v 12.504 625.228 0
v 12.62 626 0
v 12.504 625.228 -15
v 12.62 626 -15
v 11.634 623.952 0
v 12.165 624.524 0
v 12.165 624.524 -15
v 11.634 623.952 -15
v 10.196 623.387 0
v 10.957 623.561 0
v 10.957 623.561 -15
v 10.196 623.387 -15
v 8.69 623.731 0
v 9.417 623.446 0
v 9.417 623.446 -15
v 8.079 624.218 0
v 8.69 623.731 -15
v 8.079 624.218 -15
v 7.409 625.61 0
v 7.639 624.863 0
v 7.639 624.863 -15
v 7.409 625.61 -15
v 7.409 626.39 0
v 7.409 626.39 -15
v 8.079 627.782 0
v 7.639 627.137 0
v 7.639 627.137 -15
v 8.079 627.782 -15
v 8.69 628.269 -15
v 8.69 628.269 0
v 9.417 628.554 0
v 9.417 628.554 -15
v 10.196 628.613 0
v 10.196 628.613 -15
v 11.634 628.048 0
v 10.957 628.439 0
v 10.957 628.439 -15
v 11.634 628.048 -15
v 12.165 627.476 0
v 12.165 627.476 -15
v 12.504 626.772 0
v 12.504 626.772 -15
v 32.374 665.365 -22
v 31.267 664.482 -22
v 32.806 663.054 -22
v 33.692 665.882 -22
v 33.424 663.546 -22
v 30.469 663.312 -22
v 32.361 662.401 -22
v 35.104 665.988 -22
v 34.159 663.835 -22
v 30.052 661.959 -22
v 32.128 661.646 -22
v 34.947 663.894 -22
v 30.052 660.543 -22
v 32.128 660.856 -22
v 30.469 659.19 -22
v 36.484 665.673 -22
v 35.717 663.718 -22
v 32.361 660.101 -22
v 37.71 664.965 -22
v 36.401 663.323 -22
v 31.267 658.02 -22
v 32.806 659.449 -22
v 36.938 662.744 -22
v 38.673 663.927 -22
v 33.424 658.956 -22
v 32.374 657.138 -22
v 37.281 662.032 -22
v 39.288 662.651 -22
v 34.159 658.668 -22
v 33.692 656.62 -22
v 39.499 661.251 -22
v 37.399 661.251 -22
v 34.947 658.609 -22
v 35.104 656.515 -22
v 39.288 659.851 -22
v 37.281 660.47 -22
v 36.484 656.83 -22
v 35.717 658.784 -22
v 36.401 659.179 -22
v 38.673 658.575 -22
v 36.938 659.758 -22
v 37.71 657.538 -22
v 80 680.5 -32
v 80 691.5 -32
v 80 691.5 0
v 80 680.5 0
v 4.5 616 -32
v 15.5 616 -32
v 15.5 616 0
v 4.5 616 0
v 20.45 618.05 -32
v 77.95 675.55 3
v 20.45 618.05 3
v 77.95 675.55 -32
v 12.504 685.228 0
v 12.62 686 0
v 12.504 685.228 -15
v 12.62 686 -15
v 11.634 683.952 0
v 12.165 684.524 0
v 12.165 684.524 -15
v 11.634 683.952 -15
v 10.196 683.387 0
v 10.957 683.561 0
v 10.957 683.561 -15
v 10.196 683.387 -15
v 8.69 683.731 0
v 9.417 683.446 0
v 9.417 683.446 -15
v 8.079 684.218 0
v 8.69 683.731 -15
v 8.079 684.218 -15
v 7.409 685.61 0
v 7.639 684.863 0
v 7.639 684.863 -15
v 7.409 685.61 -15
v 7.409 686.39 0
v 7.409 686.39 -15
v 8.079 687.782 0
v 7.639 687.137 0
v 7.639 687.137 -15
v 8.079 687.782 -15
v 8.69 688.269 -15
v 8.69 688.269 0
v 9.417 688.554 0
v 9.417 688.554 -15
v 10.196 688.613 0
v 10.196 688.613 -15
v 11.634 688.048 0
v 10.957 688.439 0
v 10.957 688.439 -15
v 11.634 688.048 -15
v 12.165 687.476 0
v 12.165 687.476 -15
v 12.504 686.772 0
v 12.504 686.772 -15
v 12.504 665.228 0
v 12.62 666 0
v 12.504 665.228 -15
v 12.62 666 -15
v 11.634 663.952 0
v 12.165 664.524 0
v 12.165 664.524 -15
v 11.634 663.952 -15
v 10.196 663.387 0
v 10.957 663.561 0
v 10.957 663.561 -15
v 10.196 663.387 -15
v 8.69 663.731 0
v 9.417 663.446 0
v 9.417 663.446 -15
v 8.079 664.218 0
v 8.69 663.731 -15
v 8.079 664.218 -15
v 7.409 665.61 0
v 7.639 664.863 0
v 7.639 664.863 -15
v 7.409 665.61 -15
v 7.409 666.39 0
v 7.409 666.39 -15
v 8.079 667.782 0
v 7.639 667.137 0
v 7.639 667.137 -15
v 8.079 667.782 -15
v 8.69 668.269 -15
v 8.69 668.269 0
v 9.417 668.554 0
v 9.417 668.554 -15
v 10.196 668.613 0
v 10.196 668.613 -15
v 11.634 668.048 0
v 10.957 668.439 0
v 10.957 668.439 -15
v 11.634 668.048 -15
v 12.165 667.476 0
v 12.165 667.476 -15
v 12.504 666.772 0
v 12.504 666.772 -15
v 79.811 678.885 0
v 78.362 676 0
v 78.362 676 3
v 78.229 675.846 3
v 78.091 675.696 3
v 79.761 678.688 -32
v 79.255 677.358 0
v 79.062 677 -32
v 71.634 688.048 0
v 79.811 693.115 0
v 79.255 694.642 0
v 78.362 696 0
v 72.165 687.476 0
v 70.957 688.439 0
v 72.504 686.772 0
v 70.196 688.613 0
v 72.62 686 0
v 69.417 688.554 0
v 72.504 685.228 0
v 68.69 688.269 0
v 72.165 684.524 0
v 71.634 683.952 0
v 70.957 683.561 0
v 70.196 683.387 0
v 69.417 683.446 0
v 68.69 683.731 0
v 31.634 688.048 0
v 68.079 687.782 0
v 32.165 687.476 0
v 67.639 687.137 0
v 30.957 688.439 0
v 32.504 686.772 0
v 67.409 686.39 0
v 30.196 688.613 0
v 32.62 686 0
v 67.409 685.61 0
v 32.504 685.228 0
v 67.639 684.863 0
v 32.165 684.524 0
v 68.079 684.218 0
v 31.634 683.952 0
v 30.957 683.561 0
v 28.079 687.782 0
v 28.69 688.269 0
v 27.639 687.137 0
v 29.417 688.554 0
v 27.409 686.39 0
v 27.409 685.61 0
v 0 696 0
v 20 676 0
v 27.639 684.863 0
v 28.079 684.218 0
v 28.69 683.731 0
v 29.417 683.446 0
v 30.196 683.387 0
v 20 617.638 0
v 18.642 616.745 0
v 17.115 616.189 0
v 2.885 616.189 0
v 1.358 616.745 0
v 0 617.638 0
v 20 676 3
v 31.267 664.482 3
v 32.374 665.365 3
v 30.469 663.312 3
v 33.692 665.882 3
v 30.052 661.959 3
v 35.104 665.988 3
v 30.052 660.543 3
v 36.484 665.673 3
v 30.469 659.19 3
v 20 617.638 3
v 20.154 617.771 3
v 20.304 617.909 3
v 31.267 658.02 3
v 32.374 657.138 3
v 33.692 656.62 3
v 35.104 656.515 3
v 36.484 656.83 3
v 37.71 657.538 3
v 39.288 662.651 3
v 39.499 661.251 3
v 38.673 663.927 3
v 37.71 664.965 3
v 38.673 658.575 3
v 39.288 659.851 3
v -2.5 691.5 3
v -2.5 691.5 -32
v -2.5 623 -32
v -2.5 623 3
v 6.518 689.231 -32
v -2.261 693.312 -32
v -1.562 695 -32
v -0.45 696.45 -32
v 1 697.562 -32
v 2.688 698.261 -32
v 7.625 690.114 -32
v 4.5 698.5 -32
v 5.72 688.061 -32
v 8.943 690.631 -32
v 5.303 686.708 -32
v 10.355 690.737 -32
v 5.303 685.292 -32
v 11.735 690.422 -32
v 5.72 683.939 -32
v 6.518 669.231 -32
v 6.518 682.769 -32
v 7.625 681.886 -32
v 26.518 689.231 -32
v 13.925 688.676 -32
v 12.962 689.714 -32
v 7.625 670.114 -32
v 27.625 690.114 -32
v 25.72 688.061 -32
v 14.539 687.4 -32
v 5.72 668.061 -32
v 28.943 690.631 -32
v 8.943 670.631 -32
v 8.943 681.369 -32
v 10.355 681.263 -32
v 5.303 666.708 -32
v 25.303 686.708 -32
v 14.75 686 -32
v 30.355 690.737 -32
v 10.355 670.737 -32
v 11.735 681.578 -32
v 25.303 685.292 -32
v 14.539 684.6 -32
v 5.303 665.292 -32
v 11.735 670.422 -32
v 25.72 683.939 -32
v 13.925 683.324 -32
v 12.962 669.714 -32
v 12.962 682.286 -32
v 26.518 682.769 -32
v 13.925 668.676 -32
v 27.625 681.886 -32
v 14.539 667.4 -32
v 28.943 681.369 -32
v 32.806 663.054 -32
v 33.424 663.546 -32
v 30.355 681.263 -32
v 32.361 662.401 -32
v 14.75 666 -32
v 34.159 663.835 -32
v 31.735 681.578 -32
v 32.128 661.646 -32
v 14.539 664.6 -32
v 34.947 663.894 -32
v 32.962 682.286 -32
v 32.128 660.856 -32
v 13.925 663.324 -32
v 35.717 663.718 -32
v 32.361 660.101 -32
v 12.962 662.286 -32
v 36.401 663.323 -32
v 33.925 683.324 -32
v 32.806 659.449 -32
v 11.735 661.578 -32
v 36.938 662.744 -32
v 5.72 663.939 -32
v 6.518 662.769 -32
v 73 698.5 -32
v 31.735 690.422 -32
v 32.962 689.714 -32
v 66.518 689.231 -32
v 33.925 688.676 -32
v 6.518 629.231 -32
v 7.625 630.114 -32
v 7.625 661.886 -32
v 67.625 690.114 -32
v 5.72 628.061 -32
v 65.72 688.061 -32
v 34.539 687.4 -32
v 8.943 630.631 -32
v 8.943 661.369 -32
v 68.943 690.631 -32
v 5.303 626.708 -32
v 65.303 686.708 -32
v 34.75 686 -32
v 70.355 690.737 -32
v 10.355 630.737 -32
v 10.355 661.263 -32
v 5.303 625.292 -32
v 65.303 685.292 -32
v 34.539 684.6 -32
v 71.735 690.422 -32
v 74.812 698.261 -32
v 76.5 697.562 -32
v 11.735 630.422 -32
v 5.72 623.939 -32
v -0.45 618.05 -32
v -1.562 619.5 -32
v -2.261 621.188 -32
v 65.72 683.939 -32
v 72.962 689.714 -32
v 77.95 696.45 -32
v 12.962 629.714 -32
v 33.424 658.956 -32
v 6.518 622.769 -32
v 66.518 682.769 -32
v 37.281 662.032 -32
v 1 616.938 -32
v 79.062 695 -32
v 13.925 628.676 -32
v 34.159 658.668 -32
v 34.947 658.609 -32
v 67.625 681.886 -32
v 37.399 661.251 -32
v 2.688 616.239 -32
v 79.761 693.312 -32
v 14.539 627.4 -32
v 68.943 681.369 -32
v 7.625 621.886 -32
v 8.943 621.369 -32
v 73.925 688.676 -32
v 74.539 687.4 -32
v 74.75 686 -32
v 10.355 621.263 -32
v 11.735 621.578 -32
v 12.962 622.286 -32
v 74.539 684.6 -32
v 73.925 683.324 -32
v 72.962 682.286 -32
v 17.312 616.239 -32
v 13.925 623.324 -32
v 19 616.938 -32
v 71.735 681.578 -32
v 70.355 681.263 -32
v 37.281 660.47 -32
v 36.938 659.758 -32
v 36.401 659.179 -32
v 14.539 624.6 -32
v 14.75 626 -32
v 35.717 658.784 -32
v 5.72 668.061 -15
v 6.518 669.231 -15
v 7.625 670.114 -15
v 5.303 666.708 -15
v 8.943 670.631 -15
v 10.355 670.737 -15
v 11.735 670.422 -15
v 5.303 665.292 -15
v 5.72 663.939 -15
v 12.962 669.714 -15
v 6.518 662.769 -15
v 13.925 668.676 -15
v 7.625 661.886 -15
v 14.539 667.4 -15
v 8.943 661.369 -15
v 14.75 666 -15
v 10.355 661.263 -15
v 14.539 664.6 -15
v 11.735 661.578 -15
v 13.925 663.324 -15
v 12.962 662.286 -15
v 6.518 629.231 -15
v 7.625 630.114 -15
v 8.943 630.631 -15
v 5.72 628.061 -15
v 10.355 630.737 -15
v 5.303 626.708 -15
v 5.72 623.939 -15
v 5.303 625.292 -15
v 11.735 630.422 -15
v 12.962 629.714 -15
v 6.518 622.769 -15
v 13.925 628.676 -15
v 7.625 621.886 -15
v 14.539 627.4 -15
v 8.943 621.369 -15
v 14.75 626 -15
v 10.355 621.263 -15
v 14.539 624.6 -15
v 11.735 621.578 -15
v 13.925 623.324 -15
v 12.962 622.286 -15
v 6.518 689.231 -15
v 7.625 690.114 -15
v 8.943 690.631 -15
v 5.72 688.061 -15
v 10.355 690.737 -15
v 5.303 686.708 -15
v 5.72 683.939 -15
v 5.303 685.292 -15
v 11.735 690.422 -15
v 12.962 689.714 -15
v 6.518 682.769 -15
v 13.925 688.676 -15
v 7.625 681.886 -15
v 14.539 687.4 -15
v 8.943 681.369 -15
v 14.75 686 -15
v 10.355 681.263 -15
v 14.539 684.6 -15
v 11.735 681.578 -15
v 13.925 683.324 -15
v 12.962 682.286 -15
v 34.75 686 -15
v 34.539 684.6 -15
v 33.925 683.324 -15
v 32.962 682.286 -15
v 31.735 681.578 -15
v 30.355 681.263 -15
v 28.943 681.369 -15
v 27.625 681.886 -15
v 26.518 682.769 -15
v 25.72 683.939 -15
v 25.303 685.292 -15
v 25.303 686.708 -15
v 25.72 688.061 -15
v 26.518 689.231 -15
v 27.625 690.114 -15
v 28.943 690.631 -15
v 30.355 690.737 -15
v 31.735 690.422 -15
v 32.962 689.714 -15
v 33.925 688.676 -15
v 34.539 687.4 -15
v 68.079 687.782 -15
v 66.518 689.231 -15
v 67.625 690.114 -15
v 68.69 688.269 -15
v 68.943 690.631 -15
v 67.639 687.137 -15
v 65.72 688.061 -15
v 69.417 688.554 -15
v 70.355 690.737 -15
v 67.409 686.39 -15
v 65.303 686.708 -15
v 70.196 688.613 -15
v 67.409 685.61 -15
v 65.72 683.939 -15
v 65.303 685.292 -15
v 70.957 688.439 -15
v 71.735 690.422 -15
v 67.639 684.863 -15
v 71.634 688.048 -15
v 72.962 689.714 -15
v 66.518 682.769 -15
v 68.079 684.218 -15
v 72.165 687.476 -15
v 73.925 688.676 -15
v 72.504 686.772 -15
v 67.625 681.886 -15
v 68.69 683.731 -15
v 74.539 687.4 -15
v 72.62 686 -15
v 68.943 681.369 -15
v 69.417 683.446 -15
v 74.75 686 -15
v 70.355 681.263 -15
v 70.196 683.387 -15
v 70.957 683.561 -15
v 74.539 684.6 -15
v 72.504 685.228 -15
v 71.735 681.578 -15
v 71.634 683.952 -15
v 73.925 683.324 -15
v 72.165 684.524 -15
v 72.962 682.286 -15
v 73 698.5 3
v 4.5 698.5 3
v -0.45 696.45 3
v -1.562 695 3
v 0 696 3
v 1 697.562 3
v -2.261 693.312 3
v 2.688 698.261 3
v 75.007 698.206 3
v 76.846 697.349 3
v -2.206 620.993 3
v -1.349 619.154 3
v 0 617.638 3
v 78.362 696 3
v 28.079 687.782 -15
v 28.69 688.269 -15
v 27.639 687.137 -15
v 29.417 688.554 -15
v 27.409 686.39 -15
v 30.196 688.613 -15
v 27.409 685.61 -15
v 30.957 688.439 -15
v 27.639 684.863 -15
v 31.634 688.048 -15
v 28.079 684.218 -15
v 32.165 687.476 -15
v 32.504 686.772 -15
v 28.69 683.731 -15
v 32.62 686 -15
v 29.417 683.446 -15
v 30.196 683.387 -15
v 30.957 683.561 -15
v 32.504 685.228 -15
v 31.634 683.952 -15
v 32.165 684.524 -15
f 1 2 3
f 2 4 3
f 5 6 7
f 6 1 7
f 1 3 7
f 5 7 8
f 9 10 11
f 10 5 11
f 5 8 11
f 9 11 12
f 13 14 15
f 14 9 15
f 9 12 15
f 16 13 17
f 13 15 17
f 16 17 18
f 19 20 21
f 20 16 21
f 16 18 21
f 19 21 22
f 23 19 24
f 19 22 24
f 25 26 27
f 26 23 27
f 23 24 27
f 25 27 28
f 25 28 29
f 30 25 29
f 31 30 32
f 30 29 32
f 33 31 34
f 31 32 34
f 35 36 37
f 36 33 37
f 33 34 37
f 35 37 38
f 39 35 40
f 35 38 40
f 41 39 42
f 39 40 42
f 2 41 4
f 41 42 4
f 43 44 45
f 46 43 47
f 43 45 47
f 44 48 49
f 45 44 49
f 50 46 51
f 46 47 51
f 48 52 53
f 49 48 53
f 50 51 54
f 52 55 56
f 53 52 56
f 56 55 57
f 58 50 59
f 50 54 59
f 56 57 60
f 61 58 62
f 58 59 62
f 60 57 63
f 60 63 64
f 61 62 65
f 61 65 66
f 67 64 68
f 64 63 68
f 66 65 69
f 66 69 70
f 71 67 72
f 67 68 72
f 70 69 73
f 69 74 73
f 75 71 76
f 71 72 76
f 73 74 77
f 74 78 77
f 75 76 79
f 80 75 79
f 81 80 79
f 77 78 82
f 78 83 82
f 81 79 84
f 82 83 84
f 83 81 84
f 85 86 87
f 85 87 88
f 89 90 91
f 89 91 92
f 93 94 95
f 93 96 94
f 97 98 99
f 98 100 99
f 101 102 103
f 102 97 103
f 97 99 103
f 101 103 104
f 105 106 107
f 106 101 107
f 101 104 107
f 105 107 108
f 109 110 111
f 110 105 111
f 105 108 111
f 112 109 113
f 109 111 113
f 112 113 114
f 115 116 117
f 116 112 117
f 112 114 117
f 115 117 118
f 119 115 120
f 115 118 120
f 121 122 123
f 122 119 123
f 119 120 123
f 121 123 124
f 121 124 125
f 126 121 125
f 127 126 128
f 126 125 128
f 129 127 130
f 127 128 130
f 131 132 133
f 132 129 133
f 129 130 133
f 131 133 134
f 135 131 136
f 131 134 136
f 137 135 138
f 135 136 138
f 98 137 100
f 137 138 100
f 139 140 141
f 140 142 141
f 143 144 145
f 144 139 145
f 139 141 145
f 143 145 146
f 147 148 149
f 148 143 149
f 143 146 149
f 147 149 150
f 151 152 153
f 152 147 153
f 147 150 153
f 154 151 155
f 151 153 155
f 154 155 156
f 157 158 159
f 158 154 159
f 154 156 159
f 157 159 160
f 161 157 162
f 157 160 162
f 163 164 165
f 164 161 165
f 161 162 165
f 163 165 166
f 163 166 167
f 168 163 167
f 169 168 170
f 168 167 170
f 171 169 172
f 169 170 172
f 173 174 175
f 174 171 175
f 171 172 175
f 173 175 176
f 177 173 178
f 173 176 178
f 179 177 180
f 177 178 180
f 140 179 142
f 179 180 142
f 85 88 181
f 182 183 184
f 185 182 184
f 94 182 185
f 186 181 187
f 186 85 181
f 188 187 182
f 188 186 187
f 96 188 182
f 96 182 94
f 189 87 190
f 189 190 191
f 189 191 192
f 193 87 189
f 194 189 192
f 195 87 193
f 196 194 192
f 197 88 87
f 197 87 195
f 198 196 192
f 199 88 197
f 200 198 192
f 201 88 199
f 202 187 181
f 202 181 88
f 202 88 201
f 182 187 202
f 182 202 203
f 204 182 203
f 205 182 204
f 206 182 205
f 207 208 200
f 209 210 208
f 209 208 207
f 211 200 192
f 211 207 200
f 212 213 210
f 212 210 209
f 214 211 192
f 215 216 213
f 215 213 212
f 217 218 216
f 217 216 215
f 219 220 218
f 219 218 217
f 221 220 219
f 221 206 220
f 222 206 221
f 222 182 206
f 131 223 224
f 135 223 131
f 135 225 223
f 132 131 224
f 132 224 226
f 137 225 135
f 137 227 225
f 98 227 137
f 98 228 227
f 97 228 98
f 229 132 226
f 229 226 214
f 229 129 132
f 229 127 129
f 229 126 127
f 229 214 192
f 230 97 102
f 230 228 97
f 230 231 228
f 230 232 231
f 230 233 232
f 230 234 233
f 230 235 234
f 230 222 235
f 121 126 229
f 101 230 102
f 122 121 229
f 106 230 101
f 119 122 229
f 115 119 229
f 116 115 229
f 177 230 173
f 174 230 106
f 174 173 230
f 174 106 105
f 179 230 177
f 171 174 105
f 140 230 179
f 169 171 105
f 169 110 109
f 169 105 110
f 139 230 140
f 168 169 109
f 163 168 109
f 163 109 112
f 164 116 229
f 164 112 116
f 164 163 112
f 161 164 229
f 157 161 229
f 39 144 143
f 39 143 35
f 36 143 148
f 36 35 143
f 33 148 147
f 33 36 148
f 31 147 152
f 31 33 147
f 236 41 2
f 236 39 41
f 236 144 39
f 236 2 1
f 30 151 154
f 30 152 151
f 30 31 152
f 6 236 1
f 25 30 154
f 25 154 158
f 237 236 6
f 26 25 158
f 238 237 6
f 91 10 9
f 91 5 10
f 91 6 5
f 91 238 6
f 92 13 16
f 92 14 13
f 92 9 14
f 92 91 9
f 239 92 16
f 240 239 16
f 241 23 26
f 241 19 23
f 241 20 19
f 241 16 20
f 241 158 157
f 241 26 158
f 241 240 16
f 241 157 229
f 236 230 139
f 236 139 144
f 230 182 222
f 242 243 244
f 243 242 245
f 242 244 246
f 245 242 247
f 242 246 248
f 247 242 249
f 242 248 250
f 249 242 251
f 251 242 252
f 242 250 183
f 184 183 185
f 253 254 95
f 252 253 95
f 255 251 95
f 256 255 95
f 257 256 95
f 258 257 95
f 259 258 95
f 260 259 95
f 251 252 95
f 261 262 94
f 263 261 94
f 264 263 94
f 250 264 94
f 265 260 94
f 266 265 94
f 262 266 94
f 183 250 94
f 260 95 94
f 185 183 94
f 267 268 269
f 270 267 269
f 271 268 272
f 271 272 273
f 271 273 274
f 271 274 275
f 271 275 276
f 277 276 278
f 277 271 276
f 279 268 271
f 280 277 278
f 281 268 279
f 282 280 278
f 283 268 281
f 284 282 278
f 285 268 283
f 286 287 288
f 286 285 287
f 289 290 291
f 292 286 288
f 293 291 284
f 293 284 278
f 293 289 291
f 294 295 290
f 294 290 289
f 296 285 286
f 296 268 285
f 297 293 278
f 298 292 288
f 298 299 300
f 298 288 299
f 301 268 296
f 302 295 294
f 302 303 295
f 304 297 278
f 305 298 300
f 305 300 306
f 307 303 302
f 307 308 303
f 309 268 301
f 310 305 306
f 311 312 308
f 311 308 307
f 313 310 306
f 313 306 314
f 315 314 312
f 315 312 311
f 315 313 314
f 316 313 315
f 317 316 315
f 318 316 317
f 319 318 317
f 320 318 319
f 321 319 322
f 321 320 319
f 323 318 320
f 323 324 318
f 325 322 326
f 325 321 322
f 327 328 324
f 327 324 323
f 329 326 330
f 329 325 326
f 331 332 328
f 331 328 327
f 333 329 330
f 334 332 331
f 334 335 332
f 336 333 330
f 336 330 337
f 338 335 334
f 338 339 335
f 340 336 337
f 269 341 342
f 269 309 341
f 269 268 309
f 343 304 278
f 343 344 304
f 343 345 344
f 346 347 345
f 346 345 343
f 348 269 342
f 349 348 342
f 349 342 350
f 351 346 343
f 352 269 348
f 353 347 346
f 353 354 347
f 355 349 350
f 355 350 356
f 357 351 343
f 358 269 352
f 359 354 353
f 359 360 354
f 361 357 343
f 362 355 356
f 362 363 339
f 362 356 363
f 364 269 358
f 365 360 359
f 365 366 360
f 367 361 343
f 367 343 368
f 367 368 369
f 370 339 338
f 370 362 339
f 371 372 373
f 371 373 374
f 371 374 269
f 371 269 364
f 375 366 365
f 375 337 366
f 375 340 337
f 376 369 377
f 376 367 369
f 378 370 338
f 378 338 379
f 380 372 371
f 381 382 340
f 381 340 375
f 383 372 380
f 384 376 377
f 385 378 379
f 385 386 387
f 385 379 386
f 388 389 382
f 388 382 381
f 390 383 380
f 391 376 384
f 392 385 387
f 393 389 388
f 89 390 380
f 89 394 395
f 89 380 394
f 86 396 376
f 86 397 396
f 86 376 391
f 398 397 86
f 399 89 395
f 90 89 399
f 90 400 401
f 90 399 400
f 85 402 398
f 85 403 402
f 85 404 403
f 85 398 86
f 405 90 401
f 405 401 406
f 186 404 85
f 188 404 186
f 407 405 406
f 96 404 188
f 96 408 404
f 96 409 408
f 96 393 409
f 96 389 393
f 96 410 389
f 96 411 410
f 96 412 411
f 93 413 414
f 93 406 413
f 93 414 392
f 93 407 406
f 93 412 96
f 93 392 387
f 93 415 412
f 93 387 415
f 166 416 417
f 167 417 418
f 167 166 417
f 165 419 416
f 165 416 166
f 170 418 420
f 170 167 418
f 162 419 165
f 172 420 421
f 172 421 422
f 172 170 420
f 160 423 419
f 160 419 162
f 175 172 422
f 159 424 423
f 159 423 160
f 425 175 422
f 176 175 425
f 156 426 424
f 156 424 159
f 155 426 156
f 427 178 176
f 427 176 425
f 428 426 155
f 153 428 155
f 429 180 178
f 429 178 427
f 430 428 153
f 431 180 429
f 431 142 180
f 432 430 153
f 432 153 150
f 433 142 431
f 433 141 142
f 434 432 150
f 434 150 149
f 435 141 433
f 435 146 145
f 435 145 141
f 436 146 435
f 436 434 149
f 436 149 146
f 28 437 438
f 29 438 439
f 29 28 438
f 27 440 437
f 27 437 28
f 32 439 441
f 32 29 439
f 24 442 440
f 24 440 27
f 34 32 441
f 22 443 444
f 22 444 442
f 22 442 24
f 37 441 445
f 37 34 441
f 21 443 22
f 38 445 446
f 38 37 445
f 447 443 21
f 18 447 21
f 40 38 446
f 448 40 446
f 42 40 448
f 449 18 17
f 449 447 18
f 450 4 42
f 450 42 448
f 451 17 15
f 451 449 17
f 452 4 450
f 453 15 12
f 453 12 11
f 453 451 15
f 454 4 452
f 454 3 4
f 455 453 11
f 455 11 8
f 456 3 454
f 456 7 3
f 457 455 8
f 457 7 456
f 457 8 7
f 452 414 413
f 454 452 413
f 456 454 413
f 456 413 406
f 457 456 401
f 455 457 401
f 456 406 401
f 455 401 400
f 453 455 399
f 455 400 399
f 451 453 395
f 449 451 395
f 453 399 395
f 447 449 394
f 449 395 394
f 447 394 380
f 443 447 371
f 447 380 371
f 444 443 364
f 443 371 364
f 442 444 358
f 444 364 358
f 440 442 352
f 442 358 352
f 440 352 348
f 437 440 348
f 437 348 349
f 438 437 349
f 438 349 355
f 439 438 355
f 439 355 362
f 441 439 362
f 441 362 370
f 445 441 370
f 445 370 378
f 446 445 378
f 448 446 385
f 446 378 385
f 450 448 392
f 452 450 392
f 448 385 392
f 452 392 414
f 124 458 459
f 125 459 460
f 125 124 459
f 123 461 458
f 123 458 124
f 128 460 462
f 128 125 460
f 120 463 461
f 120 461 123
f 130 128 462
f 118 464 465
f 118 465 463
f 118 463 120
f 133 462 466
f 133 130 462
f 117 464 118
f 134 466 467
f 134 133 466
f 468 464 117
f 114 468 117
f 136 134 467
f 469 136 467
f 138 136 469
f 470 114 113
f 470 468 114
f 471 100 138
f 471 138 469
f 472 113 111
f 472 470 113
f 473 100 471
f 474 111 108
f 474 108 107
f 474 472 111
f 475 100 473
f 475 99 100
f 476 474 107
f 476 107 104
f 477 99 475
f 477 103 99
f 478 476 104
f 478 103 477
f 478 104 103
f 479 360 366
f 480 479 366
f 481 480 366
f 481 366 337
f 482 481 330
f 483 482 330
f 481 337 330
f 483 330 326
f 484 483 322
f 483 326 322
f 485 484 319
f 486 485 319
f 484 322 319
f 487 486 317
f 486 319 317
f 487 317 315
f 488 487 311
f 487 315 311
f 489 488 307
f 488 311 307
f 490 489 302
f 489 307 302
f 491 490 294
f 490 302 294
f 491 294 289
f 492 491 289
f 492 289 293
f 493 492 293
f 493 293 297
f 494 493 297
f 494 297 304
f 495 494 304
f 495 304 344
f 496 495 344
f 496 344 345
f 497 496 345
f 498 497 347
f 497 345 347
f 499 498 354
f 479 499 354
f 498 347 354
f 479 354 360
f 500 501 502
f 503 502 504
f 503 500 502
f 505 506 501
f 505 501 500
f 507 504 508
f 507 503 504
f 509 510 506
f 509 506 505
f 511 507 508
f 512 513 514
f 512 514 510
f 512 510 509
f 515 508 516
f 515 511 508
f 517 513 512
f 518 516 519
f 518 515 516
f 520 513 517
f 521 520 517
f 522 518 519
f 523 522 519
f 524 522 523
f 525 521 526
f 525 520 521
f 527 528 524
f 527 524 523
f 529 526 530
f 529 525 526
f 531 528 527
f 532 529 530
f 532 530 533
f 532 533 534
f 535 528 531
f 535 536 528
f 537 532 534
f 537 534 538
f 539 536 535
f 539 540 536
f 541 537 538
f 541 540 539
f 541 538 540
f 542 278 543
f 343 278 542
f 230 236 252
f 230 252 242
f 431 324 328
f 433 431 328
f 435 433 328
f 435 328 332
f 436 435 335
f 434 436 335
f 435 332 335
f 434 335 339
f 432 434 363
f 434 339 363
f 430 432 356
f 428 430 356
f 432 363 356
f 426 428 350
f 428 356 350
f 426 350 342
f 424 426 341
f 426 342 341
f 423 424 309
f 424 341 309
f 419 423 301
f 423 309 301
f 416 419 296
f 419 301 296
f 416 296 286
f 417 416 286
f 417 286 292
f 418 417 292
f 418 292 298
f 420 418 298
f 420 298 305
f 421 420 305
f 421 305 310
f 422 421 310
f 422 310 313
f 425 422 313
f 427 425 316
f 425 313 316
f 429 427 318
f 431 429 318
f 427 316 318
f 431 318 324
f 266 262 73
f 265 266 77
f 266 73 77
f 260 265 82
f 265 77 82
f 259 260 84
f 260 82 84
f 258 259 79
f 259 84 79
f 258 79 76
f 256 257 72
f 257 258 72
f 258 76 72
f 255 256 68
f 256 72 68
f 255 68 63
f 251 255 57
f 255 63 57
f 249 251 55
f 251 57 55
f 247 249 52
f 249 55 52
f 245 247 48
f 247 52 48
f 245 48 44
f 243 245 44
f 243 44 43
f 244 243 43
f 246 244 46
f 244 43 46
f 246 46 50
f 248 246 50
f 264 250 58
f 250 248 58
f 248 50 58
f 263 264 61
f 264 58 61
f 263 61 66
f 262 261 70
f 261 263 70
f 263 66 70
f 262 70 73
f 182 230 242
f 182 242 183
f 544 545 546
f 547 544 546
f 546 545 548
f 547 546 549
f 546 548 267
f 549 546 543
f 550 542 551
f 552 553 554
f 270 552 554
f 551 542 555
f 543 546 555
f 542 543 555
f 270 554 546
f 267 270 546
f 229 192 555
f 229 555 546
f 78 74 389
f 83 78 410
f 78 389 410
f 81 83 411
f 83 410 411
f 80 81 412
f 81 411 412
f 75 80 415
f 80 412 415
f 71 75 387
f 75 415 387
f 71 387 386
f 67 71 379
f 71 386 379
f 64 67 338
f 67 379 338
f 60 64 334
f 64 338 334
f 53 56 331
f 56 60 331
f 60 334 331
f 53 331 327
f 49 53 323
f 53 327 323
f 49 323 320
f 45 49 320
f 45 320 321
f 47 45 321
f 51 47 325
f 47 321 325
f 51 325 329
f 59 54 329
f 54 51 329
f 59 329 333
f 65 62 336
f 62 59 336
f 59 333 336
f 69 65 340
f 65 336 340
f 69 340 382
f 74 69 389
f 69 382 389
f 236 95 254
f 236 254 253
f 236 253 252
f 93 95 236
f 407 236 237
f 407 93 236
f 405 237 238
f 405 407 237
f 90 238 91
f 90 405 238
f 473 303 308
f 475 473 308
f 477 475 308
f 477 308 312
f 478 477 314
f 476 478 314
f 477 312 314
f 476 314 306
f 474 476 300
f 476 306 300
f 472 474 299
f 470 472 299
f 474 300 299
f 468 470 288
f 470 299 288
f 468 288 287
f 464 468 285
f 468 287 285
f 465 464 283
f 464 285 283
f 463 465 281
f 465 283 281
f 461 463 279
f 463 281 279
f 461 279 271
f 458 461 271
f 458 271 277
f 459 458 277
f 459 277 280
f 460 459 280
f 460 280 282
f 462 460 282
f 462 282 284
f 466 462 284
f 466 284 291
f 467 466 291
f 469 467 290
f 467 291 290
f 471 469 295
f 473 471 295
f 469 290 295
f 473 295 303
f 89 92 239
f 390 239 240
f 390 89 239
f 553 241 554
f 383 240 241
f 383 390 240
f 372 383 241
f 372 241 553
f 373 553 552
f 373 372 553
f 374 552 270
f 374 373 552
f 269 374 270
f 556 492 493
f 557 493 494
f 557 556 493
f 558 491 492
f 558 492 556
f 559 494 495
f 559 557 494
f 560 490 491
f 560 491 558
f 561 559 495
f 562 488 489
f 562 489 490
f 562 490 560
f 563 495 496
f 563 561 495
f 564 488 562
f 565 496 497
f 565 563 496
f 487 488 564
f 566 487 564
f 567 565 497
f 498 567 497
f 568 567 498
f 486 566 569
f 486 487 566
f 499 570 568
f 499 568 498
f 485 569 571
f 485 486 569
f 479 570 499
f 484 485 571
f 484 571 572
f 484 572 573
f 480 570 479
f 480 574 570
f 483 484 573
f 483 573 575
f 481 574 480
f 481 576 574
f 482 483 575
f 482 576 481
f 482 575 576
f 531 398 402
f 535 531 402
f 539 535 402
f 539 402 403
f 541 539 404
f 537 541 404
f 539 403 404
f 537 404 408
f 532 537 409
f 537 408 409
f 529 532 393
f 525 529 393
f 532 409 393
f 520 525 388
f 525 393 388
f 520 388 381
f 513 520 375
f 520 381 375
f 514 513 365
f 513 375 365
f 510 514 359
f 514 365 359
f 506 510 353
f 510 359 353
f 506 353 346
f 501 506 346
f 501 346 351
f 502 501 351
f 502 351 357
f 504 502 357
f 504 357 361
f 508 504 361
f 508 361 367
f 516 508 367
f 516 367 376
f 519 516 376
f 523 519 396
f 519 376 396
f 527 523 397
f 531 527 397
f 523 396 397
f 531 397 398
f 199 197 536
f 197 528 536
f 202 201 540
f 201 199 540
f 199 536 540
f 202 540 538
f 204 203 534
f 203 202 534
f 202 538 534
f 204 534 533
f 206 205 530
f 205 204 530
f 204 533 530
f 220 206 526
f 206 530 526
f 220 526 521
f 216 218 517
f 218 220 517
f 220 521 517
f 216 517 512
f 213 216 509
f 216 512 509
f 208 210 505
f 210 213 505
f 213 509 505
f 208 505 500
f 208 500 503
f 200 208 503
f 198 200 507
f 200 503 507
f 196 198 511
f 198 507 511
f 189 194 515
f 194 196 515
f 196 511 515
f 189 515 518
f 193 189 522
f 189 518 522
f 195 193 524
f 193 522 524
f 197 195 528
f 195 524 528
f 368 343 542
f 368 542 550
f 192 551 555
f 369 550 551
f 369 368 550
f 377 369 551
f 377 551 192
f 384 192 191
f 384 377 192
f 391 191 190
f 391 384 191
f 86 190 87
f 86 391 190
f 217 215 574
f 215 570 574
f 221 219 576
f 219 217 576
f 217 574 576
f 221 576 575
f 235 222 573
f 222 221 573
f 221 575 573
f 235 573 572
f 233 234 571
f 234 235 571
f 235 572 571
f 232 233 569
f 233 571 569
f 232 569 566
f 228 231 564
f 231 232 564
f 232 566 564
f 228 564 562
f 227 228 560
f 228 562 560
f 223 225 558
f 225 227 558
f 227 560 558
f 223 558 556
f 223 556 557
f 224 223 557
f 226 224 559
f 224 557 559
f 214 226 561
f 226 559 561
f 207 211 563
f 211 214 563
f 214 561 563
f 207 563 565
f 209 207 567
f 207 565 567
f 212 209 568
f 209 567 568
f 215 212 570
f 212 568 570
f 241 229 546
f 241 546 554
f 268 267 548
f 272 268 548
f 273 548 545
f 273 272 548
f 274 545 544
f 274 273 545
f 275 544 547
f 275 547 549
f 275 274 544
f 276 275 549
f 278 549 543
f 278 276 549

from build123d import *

# Parameters (mm, degrees)
SKETCH013_R          = 2.62
SKETCH013_R_2        = 2.65
PAD006_DEPTH         = 32
PAD006_DEPTH_BACK    = 3
SKETCH014_R          = 4.75
POCKET004_DEPTH      = 17
POCKET005_DEPTH      = 3.001
SKETCH109_R          = 4.75
POCKET055_DEPTH      = 22
POCKET055_DEPTH_BACK = 100


with BuildPart() as foot004:
    # Sketch013 → Pad006 (new body, two sides)
    with BuildSketch(Plane.XY) as pad006_sk:
        with BuildLine():
            Line((70, -5.5), (70, 5.5))
            ThreePointArc((70, 5.5), (69.467157, 8.178784), (67.949747, 10.449747))
            Line((67.949747, 10.449747), (10.449747, 67.949747))
            ThreePointArc((10.449747, 67.949747), (8.178784, 69.467157), (5.5, 70))
            Line((5.5, 70), (-5.5, 70))
            ThreePointArc((-5.5, 70), (-10.449747, 67.949747), (-12.5, 63))
            Line((-12.5, -5.5), (-12.5, 63))
            ThreePointArc((-12.5, -5.5), (-10.449747, -10.449747), (-5.5, -12.5))
            Line((-5.5, -12.5), (63, -12.5))
            ThreePointArc((63, -12.5), (67.949747, -10.449747), (70, -5.5))
        make_face()
        with Locations((20, 0)):
            Circle(SKETCH013_R, mode=Mode.SUBTRACT)
        with Locations((60, 0)):
            Circle(SKETCH013_R, mode=Mode.SUBTRACT)
        Circle(SKETCH013_R, mode=Mode.SUBTRACT)
        with Locations((0, 60)):
            Circle(SKETCH013_R, mode=Mode.SUBTRACT)
        with Locations((0, 20)):
            Circle(SKETCH013_R, mode=Mode.SUBTRACT)
        with Locations((24.748737, 24.748737)):
            Circle(SKETCH013_R_2, mode=Mode.SUBTRACT)
    extrude(amount=-PAD006_DEPTH)
    extrude(pad006_sk.sketch, amount=PAD006_DEPTH_BACK)

    # Sketch014 → Pocket004 (cut)
    with BuildSketch(Plane.XY.offset(-32)):
        with Locations((0, 60)):
            Circle(SKETCH014_R)
        Circle(SKETCH014_R)
        with Locations((20, 0)):
            Circle(SKETCH014_R)
        with Locations((60, 0)):
            Circle(SKETCH014_R)
        with Locations((0, 20)):
            Circle(SKETCH014_R)
    extrude(amount=POCKET004_DEPTH, mode=Mode.SUBTRACT)

    # Sketch016 → Pocket005 (cut, through all)
    with BuildSketch(Plane.XY):
        Polygon((10, 100), (10, 10), (140, 10), (140, -10), (-10, -10), (-10, 100), align=None)
    extrude(amount=POCKET005_DEPTH, mode=Mode.SUBTRACT)

    # Sketch109 → Pocket055 (cut, two sides)
    with BuildSketch(Plane.XY) as pocket055_sk:
        with Locations((24.748737, 24.748737)):
            Circle(SKETCH109_R)
    extrude(amount=-POCKET055_DEPTH, mode=Mode.SUBTRACT)
    extrude(pocket055_sk.sketch, amount=POCKET055_DEPTH_BACK, mode=Mode.SUBTRACT)


with BuildPart() as foot1:
    # Part__Mirroring: instance of Foot004
    add(foot004.part.mirror(Plane(origin=(38.75, -2e-06, -14.5), x_dir=(1, 0, 0), z_dir=(0, 1, 0))))


with BuildPart() as foot1_1:
    # Part__Mirroring placement: moved
    add(foot1.part.moved(Location((10, 686, 0))))


solid = foot1_1.part
